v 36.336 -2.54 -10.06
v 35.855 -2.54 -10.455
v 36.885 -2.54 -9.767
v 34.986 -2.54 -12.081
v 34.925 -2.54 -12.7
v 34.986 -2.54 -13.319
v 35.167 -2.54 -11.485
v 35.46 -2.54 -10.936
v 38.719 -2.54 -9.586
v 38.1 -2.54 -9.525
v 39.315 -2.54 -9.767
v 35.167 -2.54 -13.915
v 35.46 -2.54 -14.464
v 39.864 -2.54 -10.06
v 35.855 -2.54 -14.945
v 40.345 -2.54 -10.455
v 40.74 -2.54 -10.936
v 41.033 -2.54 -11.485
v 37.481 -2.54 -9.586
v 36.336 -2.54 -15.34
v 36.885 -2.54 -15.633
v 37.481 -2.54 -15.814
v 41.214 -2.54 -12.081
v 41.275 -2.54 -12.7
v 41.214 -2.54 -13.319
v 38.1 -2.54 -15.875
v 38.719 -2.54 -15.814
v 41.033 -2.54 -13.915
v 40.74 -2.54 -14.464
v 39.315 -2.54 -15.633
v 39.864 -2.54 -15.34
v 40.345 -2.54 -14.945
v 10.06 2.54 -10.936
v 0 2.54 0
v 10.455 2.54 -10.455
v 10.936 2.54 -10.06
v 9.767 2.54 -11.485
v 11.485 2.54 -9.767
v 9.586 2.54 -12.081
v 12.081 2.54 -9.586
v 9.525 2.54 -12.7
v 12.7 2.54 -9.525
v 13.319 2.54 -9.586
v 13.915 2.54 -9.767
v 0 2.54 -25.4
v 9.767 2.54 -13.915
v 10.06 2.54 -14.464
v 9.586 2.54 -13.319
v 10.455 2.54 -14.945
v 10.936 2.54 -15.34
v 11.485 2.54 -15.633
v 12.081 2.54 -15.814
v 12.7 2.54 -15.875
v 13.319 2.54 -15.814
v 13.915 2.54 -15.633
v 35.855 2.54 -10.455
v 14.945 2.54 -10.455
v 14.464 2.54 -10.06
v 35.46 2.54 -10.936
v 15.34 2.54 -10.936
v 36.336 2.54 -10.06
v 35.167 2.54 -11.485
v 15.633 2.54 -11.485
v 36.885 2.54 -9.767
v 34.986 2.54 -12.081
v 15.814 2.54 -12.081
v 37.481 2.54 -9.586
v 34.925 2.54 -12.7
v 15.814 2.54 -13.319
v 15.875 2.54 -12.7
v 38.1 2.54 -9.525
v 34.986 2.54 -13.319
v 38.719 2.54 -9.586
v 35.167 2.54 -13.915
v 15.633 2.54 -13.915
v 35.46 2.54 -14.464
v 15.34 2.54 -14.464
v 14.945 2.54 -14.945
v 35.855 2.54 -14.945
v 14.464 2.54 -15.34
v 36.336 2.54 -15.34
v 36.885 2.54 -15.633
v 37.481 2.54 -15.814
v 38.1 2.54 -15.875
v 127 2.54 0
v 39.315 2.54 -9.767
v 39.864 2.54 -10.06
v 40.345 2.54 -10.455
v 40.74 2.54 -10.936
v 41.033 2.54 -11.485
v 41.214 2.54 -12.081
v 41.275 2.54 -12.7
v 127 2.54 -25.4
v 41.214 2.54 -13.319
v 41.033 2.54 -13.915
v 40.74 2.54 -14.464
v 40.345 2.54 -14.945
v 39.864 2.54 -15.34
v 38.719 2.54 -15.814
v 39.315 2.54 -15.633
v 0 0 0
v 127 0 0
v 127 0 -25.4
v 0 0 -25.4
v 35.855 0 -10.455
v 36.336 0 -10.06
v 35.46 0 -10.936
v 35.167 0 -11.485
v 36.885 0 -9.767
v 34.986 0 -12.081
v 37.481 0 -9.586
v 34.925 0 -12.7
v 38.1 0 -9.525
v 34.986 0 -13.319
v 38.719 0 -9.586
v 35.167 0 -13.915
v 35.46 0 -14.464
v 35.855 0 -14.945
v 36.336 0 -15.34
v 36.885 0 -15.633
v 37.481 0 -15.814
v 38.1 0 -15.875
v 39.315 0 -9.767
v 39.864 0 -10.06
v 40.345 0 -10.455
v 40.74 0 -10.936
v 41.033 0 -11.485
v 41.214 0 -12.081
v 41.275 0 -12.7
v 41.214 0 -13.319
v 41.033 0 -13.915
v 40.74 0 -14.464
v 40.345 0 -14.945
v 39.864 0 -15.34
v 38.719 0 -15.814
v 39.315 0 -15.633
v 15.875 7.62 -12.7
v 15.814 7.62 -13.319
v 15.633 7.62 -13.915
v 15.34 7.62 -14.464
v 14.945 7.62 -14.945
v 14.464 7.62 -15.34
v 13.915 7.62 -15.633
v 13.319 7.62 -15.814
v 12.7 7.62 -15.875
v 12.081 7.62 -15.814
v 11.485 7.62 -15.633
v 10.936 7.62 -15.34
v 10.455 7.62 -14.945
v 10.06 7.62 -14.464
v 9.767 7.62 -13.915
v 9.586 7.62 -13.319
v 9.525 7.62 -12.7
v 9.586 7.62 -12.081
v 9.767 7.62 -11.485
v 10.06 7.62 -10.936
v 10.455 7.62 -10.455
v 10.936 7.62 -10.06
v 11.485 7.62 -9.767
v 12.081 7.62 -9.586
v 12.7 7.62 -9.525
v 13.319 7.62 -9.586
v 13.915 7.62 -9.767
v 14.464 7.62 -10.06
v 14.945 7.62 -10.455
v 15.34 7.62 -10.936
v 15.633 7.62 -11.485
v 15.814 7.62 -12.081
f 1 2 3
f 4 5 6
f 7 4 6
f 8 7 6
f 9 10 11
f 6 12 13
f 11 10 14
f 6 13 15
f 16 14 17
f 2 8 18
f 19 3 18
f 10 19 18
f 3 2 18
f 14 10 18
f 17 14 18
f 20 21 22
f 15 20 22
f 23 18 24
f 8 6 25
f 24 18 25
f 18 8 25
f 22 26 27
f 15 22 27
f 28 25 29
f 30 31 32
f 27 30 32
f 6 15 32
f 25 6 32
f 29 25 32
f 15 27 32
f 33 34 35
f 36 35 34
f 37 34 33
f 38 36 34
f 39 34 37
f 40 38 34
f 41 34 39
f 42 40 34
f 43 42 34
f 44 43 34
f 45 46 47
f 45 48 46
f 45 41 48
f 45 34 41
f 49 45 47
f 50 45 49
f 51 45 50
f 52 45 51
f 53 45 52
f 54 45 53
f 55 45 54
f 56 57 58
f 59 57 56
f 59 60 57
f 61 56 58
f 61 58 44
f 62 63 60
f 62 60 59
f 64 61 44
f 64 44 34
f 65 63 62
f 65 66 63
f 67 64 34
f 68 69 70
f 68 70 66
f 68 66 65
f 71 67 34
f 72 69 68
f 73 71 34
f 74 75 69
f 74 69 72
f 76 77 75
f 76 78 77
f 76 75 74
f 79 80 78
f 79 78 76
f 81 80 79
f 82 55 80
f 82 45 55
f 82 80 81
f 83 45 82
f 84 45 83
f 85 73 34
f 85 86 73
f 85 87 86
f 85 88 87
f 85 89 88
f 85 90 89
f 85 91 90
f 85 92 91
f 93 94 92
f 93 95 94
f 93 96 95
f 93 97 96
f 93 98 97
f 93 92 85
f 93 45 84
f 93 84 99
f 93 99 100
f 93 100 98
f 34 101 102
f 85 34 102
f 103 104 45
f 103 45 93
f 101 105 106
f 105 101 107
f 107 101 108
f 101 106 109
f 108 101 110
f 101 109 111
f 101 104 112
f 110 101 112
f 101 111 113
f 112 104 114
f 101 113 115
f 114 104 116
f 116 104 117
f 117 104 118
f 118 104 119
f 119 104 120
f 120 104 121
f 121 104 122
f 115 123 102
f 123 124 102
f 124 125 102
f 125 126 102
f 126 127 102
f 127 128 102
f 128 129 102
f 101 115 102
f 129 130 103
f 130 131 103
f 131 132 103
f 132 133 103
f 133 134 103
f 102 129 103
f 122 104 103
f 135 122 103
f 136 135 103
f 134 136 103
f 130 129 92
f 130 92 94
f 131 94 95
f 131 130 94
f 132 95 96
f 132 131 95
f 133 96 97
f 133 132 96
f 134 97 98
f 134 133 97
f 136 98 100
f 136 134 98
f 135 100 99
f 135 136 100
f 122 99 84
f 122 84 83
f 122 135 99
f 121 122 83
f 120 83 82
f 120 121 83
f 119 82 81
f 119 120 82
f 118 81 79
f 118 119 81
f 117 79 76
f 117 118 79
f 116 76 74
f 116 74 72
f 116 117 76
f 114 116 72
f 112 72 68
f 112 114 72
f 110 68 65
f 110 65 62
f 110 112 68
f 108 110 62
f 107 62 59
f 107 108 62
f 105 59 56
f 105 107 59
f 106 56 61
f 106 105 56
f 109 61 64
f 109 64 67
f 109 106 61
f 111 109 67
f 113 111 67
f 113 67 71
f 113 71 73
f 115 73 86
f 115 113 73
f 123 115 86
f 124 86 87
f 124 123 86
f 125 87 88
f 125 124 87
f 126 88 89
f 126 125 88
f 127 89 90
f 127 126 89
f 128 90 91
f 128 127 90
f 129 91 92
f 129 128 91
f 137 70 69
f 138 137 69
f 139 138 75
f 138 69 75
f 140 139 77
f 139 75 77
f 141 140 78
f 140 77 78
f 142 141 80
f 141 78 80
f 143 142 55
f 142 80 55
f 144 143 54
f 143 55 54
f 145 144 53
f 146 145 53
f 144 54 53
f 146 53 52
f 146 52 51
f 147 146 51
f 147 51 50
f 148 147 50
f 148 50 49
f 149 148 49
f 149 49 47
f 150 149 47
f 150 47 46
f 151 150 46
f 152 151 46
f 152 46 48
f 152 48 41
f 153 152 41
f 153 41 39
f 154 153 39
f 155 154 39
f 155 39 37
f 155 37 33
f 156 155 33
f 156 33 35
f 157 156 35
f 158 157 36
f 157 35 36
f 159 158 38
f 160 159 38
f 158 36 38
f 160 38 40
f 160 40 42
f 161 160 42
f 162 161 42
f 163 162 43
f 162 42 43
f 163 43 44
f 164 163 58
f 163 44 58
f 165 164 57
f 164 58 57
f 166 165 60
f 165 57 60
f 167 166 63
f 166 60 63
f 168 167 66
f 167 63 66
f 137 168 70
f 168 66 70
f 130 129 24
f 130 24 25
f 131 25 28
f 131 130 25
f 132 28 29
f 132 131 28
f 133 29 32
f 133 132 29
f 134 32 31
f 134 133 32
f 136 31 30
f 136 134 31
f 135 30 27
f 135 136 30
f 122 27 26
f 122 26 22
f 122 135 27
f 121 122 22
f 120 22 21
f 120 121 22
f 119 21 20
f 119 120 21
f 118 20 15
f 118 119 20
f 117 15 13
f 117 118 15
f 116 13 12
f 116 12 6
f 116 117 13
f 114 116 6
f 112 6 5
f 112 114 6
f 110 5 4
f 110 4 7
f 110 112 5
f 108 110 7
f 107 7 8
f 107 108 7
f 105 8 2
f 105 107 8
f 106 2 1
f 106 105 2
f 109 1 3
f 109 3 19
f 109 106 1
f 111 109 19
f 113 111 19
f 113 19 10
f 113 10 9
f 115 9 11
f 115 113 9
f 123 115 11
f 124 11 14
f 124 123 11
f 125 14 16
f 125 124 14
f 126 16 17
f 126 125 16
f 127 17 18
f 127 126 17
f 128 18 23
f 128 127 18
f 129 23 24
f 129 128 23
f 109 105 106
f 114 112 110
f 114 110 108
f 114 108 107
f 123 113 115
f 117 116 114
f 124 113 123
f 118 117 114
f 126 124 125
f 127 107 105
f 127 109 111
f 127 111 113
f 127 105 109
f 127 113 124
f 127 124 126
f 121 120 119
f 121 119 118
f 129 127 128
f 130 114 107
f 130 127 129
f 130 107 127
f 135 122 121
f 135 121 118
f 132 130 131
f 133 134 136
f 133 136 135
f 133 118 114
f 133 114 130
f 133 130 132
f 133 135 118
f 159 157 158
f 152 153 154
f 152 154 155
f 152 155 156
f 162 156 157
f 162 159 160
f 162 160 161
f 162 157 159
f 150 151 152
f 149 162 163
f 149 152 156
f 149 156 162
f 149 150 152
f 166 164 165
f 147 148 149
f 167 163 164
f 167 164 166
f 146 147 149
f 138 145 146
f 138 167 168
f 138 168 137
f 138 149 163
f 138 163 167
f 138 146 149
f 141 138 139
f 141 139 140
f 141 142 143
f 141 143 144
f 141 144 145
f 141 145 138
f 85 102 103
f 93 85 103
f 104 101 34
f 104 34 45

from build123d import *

# Parameters (mm, degrees)
SKETCH2_W           = 127
SKETCH2_H           = 25.4
SKETCH2_R           = 3.175
BOSS_EXTRUDE1_DEPTH = 2.54
SKETCH2_2_R         = 3.175
BOSS_EXTRUDE2_DEPTH = 7.62
SKETCH2_3_R         = 3.175
BOSS_EXTRUDE3_DEPTH = 2.54


with BuildPart() as part:
    # Sketch2 → Boss-Extrude1 (new body)
    with BuildSketch(Plane(origin=(0, 0, 0), x_dir=(1, 0, 0), z_dir=(0, 1, 0))):
        with Locations((63.5, 12.7)):
            Rectangle(SKETCH2_W, SKETCH2_H)
        with Locations((12.7, 12.7)):
            Circle(SKETCH2_R, mode=Mode.SUBTRACT)
        with Locations((38.1, 12.7)):
            Circle(SKETCH2_R, mode=Mode.SUBTRACT)
    extrude(amount=BOSS_EXTRUDE1_DEPTH)

    # Sketch2<2> → Boss-Extrude2 (add)
    with BuildSketch(Plane(origin=(0, 0, 0), x_dir=(1, 0, 0), z_dir=(0, 1, 0))):
        with Locations((12.7, 12.7)):
            Circle(SKETCH2_2_R)
    extrude(amount=BOSS_EXTRUDE2_DEPTH)


with BuildPart() as body_2:
    # Sketch2<3> → Boss-Extrude3 (new body)
    with BuildSketch(Plane(origin=(0, 0, 0), x_dir=(1, 0, 0), z_dir=(0, 1, 0))):
        with Locations((38.1, 12.7)):
            Circle(SKETCH2_3_R)
    extrude(amount=-BOSS_EXTRUDE3_DEPTH)


solid = Compound([part.part, body_2.part])
